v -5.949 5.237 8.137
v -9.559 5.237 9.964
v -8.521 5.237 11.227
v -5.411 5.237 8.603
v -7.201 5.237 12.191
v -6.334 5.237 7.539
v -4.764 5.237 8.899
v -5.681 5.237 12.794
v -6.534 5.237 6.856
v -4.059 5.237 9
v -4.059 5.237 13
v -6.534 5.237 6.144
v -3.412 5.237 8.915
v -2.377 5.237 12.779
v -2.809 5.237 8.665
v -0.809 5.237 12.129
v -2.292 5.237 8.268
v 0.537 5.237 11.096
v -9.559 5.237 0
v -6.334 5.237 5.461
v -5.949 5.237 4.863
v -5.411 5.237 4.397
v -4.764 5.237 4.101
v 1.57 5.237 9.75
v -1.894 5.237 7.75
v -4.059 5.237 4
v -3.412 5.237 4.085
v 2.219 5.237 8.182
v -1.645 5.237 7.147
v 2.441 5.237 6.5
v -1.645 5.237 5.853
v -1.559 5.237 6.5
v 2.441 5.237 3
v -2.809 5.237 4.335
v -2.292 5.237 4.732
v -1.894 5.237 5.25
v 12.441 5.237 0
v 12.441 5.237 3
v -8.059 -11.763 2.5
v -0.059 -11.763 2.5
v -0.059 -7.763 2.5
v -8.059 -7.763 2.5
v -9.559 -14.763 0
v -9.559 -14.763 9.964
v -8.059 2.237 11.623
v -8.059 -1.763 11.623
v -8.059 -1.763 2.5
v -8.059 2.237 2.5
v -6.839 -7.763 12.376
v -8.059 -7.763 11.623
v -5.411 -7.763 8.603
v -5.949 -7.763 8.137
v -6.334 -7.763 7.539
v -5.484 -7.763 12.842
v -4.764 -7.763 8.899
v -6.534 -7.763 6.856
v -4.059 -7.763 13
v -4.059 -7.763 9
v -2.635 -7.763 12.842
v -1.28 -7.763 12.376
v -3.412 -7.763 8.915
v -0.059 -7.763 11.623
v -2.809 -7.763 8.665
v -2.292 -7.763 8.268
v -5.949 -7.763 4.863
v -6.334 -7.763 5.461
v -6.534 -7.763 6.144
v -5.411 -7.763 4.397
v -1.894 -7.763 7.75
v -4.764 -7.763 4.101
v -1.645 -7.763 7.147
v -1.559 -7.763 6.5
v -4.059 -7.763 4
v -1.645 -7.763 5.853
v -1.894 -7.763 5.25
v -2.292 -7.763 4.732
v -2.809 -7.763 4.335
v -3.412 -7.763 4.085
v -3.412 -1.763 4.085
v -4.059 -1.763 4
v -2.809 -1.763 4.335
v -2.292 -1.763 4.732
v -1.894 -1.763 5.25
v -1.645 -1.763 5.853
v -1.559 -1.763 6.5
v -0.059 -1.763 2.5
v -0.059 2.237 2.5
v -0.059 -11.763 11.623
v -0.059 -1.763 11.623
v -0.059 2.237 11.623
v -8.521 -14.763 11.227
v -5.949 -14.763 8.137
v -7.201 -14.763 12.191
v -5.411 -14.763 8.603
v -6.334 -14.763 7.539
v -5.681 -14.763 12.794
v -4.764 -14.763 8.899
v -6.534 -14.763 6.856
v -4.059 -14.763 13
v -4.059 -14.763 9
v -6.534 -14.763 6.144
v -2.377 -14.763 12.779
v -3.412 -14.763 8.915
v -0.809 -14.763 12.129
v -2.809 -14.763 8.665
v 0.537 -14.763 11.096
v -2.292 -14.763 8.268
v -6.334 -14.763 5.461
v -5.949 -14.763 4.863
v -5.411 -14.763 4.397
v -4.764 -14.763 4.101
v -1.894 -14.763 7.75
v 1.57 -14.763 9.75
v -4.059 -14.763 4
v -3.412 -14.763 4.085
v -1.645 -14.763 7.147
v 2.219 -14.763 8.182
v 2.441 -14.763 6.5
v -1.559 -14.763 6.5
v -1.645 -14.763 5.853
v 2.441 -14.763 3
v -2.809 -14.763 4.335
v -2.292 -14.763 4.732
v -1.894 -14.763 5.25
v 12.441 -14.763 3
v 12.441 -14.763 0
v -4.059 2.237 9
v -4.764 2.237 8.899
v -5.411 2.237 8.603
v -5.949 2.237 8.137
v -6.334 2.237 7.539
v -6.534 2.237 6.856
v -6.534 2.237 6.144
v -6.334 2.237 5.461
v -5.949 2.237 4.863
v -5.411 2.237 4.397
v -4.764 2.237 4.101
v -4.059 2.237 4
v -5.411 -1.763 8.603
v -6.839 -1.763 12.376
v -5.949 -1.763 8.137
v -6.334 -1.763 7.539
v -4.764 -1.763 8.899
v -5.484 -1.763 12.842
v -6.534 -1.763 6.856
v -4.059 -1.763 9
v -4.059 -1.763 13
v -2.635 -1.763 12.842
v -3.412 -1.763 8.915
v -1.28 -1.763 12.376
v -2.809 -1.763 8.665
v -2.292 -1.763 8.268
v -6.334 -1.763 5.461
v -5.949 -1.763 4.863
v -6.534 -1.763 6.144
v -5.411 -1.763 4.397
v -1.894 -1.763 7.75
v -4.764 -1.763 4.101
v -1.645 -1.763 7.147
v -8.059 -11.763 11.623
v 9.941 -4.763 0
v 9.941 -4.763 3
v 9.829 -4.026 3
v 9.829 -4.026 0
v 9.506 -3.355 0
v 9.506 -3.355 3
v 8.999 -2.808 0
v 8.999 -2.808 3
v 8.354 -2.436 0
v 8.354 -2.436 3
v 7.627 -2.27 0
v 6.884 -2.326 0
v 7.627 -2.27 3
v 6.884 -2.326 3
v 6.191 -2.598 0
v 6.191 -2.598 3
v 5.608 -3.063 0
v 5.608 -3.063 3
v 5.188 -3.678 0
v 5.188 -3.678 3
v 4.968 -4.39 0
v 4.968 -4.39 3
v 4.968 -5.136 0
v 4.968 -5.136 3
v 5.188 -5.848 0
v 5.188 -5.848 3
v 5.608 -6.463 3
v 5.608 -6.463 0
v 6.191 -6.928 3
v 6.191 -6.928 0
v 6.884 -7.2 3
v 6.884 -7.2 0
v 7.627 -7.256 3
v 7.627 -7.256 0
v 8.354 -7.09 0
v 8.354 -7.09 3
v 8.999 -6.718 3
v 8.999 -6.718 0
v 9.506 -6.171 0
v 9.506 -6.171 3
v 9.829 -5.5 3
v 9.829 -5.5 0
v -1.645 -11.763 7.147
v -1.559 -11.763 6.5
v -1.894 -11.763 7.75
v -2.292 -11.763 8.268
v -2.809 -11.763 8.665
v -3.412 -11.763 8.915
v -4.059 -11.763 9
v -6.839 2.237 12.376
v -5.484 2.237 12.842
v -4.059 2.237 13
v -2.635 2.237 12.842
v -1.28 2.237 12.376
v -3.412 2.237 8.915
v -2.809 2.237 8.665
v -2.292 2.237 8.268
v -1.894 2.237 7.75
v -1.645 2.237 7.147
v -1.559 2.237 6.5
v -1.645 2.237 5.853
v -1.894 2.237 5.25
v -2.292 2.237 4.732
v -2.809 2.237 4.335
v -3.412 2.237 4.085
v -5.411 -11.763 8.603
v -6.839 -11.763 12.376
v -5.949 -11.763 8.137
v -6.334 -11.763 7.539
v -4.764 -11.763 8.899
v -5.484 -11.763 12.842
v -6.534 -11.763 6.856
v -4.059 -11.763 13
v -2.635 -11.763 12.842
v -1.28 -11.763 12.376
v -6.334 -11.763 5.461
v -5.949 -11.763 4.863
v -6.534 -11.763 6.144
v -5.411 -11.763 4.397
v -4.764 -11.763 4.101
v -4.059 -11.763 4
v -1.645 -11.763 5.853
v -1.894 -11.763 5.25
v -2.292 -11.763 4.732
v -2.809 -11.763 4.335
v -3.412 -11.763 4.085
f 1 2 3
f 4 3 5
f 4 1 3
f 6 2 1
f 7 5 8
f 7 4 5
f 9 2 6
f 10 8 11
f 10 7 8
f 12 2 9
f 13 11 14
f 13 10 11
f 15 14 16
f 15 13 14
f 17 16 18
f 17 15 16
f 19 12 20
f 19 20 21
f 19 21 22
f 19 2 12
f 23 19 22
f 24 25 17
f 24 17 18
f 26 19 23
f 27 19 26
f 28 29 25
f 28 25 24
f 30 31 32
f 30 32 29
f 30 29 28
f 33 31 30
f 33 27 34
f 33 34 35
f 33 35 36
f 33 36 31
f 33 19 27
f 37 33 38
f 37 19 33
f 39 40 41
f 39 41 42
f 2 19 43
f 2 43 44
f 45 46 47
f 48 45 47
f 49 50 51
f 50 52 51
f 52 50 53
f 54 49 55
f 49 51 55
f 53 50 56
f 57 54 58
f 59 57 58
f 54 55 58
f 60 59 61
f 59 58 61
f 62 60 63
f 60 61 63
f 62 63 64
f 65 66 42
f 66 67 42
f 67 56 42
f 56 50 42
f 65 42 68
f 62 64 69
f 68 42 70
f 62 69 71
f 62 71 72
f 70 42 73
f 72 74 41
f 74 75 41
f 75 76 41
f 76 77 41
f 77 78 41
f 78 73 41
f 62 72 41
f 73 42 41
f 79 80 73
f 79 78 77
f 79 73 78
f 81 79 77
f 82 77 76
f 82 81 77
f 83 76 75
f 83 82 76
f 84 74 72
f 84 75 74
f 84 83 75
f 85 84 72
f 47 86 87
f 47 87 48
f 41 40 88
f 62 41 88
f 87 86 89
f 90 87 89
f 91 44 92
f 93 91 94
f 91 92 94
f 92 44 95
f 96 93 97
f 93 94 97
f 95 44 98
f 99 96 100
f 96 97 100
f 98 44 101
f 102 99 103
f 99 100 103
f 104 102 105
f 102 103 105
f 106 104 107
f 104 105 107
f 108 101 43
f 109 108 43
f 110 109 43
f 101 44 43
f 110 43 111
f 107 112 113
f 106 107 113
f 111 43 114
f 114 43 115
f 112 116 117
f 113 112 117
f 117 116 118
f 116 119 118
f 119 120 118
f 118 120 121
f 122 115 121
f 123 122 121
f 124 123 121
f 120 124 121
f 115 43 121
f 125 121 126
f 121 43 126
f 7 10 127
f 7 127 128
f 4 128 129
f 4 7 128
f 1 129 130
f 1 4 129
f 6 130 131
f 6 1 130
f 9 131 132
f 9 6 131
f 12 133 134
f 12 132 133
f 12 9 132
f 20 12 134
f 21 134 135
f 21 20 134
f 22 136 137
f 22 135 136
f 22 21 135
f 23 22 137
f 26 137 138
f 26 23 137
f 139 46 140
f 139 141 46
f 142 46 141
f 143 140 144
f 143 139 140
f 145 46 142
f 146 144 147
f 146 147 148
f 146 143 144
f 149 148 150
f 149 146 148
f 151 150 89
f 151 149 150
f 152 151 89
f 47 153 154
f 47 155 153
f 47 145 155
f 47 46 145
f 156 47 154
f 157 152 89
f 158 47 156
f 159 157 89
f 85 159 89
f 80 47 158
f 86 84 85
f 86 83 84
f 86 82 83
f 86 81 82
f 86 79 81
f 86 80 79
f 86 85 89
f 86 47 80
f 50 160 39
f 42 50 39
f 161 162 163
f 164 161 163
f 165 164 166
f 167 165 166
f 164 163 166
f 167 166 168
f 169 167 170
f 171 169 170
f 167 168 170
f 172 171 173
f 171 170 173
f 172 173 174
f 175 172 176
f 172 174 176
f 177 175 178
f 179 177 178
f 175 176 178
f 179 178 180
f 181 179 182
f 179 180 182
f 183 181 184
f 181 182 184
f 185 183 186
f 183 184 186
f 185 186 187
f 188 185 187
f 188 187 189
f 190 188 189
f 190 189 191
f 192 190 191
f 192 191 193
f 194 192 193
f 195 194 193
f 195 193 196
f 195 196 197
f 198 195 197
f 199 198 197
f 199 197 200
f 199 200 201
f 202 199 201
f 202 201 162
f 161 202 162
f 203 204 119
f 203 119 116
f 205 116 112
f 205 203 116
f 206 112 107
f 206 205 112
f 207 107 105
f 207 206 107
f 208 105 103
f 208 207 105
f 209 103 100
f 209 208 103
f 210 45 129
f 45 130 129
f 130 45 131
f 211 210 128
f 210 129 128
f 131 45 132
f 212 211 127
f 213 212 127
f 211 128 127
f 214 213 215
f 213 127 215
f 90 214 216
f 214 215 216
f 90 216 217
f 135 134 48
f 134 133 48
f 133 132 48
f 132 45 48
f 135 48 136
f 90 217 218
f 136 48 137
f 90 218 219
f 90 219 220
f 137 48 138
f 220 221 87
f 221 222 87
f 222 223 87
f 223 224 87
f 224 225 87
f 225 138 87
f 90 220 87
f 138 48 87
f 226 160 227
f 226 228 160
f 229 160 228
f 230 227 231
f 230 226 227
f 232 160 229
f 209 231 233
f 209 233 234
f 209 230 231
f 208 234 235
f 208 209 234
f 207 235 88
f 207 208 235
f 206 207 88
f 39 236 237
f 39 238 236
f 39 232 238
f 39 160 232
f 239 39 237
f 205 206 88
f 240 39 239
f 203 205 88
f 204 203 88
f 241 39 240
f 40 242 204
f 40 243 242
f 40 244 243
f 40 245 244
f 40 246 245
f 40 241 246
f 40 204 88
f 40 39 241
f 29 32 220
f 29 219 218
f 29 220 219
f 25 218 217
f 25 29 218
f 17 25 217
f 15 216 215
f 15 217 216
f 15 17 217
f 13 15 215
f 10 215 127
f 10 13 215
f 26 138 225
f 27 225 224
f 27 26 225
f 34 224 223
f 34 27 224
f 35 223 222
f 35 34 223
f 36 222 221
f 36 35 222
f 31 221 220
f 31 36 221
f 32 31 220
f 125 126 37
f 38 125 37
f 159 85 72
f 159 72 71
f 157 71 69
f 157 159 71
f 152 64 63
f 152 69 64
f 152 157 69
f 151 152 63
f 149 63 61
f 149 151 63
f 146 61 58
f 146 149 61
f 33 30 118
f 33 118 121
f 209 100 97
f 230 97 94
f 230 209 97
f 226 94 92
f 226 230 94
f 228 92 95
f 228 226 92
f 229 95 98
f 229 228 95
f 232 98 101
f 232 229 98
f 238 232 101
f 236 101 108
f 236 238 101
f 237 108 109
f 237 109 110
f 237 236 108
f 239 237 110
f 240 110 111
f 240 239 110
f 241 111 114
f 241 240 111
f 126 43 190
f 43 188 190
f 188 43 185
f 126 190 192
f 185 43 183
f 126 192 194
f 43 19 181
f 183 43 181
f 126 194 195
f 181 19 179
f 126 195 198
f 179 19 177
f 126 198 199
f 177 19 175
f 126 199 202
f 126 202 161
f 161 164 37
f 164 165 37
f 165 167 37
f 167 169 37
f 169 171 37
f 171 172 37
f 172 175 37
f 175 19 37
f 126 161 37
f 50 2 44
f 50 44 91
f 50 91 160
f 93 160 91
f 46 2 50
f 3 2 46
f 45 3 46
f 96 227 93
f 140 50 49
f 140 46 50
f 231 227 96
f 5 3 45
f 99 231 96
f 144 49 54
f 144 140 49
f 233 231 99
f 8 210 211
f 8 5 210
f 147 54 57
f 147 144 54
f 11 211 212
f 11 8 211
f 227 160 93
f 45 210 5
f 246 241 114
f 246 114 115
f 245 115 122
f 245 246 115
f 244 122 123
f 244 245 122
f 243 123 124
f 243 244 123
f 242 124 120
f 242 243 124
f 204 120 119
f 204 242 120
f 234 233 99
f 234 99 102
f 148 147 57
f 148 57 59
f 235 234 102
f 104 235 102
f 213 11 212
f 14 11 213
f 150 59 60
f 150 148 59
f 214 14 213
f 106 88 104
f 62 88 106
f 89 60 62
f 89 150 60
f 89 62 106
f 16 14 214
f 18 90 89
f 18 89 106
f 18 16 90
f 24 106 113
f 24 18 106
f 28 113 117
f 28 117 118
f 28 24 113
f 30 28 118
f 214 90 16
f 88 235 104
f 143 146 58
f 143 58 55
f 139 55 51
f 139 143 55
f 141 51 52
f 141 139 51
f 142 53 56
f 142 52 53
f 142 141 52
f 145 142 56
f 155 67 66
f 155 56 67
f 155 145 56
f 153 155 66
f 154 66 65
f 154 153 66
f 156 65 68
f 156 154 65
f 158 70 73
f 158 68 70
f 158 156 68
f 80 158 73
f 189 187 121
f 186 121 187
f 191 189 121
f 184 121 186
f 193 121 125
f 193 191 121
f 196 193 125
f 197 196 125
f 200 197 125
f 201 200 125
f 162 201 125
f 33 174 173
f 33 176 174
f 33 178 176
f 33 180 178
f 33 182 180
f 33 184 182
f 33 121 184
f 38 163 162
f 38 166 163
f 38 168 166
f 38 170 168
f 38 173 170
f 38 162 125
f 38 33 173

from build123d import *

# Parameters (mm, degrees)
SKETCH1_W           = 23
SKETCH1_H           = 20
BOSS_EXTRUDE1_DEPTH = 3
BOSS_EXTRUDE2_DEPTH = 20
CUT_EXTRUDE2_DEPTH  = 2
LPATTERN2_COUNT     = 2
LPATTERN2_PITCH     = 10
SKETCH6_R           = 2.5
CUT_EXTRUDE3_DEPTH  = 4
SKETCH7_W           = 15.359271736
SKETCH7_H           = 20
CUT_EXTRUDE4_DEPTH  = 1


with BuildPart() as part:
    # Sketch1 → Boss-Extrude1 (new body)
    with BuildSketch(Plane.XY):
        with Locations((0.940520446, -4.763011152)):
            Rectangle(SKETCH1_W, SKETCH1_H)
    extrude(amount=BOSS_EXTRUDE1_DEPTH)

    # Sketch2 → Boss-Extrude2 (add, through all)
    with BuildSketch(Plane(origin=(0, 5.236988848, 0), x_dir=(1, 0, 0), z_dir=(0, 1, 0))):
        with BuildLine():
            ThreePointArc((1.417746021, -3), (-0.936980555, -0.799122875), (-4.059479554, 0))
            Line((-4.059479554, 0), (-4.059479554, -3))
            Line((-4.059479554, -3), (1.417746021, -3))
        make_face()
        with BuildLine():
            Line((-4.059479554, -3), (-4.059479554, 0))
            ThreePointArc((-4.059479554, 0), (-7.181978553, -0.799122875), (-9.536705129, -3))
            Line((-9.536705129, -3), (-4.059479554, -3))
        make_face()
        with BuildLine():
            Line((1.417746021, -3), (-4.059479554, -3))
            Line((-4.059479554, -3), (-4.059479554, -4))
            ThreePointArc((-4.059479554, -4), (-2.291712601, -4.732233047), (-1.559479554, -6.5))
            ThreePointArc((-1.559479554, -6.5), (-2.291712601, -8.267766953), (-4.059479554, -9))
            Line((-4.059479554, -9), (-4.059479554, -13))
            ThreePointArc((-4.059479554, -13), (0.536714524, -11.096194078), (2.440520446, -6.5))
            ThreePointArc((2.440520446, -6.5), (2.179589537, -4.676811342), (1.417746021, -3))
        make_face()
        with BuildLine():
            Line((-4.059479554, -4), (-4.059479554, -3))
            Line((-4.059479554, -3), (-9.536705129, -3))
            ThreePointArc((-9.536705129, -3), (-10.298548645, -4.676811342), (-10.559479554, -6.5))
            ThreePointArc((-10.559479554, -6.5), (-8.655673632, -11.096194078), (-4.059479554, -13))
            Line((-4.059479554, -13), (-4.059479554, -9))
            ThreePointArc((-4.059479554, -9), (-6.559479554, -6.5), (-4.059479554, -4))
        make_face()
        with BuildLine():
            ThreePointArc((-10.559479554, -6.5), (-10.298548645, -4.676811342), (-9.536705129, -3))
            Line((-9.536705129, -3), (-10.559479554, -3))
            Line((-10.559479554, -3), (-10.559479554, -6.5))
        make_face()
        with BuildLine():
            Line((2.440520446, -3), (1.417746021, -3))
            ThreePointArc((1.417746021, -3), (2.179589537, -4.676811342), (2.440520446, -6.5))
            Line((2.440520446, -6.5), (2.440520446, -3))
        make_face()
    extrude(amount=-BOSS_EXTRUDE2_DEPTH)

    # Sketch4 → Cut-Extrude2 (cut, symmetric)
    with BuildSketch(Plane(origin=(0, 0.236988848, 0), x_dir=(-1, 0, 0), z_dir=(0, -1, 0))):
        Polygon((0.059479554, -2.5), (8.059479554, -2.5), (8.059479554, -10.5), (8.059479554, -14.57083766), (0.059479554, -14.57083766), (0.059479554, -10.5), align=None)
    cut_extrude2 = extrude(amount=CUT_EXTRUDE2_DEPTH, both=True, mode=Mode.SUBTRACT)

    # LPattern2: Cut-Extrude2 ×2
    with Locations(*[(0, -i * LPATTERN2_PITCH, 0) for i in range(1, LPATTERN2_COUNT)]):
        add(cut_extrude2, mode=Mode.SUBTRACT)

    # Sketch6 → Cut-Extrude3 (cut)
    with BuildSketch(Plane.XY.offset(3)):
        with Locations((7.440520446, -4.763011152)):
            Circle(SKETCH6_R)
    extrude(amount=-CUT_EXTRUDE3_DEPTH, mode=Mode.SUBTRACT)

    # Sketch7 → Cut-Extrude4 (cut)
    with BuildSketch(Plane.ZY.offset(10.559479554)):
        with Locations((7.679635868, -4.763011152)):
            Rectangle(SKETCH7_W, SKETCH7_H)
    extrude(amount=-CUT_EXTRUDE4_DEPTH, mode=Mode.SUBTRACT)


solid = part.part
